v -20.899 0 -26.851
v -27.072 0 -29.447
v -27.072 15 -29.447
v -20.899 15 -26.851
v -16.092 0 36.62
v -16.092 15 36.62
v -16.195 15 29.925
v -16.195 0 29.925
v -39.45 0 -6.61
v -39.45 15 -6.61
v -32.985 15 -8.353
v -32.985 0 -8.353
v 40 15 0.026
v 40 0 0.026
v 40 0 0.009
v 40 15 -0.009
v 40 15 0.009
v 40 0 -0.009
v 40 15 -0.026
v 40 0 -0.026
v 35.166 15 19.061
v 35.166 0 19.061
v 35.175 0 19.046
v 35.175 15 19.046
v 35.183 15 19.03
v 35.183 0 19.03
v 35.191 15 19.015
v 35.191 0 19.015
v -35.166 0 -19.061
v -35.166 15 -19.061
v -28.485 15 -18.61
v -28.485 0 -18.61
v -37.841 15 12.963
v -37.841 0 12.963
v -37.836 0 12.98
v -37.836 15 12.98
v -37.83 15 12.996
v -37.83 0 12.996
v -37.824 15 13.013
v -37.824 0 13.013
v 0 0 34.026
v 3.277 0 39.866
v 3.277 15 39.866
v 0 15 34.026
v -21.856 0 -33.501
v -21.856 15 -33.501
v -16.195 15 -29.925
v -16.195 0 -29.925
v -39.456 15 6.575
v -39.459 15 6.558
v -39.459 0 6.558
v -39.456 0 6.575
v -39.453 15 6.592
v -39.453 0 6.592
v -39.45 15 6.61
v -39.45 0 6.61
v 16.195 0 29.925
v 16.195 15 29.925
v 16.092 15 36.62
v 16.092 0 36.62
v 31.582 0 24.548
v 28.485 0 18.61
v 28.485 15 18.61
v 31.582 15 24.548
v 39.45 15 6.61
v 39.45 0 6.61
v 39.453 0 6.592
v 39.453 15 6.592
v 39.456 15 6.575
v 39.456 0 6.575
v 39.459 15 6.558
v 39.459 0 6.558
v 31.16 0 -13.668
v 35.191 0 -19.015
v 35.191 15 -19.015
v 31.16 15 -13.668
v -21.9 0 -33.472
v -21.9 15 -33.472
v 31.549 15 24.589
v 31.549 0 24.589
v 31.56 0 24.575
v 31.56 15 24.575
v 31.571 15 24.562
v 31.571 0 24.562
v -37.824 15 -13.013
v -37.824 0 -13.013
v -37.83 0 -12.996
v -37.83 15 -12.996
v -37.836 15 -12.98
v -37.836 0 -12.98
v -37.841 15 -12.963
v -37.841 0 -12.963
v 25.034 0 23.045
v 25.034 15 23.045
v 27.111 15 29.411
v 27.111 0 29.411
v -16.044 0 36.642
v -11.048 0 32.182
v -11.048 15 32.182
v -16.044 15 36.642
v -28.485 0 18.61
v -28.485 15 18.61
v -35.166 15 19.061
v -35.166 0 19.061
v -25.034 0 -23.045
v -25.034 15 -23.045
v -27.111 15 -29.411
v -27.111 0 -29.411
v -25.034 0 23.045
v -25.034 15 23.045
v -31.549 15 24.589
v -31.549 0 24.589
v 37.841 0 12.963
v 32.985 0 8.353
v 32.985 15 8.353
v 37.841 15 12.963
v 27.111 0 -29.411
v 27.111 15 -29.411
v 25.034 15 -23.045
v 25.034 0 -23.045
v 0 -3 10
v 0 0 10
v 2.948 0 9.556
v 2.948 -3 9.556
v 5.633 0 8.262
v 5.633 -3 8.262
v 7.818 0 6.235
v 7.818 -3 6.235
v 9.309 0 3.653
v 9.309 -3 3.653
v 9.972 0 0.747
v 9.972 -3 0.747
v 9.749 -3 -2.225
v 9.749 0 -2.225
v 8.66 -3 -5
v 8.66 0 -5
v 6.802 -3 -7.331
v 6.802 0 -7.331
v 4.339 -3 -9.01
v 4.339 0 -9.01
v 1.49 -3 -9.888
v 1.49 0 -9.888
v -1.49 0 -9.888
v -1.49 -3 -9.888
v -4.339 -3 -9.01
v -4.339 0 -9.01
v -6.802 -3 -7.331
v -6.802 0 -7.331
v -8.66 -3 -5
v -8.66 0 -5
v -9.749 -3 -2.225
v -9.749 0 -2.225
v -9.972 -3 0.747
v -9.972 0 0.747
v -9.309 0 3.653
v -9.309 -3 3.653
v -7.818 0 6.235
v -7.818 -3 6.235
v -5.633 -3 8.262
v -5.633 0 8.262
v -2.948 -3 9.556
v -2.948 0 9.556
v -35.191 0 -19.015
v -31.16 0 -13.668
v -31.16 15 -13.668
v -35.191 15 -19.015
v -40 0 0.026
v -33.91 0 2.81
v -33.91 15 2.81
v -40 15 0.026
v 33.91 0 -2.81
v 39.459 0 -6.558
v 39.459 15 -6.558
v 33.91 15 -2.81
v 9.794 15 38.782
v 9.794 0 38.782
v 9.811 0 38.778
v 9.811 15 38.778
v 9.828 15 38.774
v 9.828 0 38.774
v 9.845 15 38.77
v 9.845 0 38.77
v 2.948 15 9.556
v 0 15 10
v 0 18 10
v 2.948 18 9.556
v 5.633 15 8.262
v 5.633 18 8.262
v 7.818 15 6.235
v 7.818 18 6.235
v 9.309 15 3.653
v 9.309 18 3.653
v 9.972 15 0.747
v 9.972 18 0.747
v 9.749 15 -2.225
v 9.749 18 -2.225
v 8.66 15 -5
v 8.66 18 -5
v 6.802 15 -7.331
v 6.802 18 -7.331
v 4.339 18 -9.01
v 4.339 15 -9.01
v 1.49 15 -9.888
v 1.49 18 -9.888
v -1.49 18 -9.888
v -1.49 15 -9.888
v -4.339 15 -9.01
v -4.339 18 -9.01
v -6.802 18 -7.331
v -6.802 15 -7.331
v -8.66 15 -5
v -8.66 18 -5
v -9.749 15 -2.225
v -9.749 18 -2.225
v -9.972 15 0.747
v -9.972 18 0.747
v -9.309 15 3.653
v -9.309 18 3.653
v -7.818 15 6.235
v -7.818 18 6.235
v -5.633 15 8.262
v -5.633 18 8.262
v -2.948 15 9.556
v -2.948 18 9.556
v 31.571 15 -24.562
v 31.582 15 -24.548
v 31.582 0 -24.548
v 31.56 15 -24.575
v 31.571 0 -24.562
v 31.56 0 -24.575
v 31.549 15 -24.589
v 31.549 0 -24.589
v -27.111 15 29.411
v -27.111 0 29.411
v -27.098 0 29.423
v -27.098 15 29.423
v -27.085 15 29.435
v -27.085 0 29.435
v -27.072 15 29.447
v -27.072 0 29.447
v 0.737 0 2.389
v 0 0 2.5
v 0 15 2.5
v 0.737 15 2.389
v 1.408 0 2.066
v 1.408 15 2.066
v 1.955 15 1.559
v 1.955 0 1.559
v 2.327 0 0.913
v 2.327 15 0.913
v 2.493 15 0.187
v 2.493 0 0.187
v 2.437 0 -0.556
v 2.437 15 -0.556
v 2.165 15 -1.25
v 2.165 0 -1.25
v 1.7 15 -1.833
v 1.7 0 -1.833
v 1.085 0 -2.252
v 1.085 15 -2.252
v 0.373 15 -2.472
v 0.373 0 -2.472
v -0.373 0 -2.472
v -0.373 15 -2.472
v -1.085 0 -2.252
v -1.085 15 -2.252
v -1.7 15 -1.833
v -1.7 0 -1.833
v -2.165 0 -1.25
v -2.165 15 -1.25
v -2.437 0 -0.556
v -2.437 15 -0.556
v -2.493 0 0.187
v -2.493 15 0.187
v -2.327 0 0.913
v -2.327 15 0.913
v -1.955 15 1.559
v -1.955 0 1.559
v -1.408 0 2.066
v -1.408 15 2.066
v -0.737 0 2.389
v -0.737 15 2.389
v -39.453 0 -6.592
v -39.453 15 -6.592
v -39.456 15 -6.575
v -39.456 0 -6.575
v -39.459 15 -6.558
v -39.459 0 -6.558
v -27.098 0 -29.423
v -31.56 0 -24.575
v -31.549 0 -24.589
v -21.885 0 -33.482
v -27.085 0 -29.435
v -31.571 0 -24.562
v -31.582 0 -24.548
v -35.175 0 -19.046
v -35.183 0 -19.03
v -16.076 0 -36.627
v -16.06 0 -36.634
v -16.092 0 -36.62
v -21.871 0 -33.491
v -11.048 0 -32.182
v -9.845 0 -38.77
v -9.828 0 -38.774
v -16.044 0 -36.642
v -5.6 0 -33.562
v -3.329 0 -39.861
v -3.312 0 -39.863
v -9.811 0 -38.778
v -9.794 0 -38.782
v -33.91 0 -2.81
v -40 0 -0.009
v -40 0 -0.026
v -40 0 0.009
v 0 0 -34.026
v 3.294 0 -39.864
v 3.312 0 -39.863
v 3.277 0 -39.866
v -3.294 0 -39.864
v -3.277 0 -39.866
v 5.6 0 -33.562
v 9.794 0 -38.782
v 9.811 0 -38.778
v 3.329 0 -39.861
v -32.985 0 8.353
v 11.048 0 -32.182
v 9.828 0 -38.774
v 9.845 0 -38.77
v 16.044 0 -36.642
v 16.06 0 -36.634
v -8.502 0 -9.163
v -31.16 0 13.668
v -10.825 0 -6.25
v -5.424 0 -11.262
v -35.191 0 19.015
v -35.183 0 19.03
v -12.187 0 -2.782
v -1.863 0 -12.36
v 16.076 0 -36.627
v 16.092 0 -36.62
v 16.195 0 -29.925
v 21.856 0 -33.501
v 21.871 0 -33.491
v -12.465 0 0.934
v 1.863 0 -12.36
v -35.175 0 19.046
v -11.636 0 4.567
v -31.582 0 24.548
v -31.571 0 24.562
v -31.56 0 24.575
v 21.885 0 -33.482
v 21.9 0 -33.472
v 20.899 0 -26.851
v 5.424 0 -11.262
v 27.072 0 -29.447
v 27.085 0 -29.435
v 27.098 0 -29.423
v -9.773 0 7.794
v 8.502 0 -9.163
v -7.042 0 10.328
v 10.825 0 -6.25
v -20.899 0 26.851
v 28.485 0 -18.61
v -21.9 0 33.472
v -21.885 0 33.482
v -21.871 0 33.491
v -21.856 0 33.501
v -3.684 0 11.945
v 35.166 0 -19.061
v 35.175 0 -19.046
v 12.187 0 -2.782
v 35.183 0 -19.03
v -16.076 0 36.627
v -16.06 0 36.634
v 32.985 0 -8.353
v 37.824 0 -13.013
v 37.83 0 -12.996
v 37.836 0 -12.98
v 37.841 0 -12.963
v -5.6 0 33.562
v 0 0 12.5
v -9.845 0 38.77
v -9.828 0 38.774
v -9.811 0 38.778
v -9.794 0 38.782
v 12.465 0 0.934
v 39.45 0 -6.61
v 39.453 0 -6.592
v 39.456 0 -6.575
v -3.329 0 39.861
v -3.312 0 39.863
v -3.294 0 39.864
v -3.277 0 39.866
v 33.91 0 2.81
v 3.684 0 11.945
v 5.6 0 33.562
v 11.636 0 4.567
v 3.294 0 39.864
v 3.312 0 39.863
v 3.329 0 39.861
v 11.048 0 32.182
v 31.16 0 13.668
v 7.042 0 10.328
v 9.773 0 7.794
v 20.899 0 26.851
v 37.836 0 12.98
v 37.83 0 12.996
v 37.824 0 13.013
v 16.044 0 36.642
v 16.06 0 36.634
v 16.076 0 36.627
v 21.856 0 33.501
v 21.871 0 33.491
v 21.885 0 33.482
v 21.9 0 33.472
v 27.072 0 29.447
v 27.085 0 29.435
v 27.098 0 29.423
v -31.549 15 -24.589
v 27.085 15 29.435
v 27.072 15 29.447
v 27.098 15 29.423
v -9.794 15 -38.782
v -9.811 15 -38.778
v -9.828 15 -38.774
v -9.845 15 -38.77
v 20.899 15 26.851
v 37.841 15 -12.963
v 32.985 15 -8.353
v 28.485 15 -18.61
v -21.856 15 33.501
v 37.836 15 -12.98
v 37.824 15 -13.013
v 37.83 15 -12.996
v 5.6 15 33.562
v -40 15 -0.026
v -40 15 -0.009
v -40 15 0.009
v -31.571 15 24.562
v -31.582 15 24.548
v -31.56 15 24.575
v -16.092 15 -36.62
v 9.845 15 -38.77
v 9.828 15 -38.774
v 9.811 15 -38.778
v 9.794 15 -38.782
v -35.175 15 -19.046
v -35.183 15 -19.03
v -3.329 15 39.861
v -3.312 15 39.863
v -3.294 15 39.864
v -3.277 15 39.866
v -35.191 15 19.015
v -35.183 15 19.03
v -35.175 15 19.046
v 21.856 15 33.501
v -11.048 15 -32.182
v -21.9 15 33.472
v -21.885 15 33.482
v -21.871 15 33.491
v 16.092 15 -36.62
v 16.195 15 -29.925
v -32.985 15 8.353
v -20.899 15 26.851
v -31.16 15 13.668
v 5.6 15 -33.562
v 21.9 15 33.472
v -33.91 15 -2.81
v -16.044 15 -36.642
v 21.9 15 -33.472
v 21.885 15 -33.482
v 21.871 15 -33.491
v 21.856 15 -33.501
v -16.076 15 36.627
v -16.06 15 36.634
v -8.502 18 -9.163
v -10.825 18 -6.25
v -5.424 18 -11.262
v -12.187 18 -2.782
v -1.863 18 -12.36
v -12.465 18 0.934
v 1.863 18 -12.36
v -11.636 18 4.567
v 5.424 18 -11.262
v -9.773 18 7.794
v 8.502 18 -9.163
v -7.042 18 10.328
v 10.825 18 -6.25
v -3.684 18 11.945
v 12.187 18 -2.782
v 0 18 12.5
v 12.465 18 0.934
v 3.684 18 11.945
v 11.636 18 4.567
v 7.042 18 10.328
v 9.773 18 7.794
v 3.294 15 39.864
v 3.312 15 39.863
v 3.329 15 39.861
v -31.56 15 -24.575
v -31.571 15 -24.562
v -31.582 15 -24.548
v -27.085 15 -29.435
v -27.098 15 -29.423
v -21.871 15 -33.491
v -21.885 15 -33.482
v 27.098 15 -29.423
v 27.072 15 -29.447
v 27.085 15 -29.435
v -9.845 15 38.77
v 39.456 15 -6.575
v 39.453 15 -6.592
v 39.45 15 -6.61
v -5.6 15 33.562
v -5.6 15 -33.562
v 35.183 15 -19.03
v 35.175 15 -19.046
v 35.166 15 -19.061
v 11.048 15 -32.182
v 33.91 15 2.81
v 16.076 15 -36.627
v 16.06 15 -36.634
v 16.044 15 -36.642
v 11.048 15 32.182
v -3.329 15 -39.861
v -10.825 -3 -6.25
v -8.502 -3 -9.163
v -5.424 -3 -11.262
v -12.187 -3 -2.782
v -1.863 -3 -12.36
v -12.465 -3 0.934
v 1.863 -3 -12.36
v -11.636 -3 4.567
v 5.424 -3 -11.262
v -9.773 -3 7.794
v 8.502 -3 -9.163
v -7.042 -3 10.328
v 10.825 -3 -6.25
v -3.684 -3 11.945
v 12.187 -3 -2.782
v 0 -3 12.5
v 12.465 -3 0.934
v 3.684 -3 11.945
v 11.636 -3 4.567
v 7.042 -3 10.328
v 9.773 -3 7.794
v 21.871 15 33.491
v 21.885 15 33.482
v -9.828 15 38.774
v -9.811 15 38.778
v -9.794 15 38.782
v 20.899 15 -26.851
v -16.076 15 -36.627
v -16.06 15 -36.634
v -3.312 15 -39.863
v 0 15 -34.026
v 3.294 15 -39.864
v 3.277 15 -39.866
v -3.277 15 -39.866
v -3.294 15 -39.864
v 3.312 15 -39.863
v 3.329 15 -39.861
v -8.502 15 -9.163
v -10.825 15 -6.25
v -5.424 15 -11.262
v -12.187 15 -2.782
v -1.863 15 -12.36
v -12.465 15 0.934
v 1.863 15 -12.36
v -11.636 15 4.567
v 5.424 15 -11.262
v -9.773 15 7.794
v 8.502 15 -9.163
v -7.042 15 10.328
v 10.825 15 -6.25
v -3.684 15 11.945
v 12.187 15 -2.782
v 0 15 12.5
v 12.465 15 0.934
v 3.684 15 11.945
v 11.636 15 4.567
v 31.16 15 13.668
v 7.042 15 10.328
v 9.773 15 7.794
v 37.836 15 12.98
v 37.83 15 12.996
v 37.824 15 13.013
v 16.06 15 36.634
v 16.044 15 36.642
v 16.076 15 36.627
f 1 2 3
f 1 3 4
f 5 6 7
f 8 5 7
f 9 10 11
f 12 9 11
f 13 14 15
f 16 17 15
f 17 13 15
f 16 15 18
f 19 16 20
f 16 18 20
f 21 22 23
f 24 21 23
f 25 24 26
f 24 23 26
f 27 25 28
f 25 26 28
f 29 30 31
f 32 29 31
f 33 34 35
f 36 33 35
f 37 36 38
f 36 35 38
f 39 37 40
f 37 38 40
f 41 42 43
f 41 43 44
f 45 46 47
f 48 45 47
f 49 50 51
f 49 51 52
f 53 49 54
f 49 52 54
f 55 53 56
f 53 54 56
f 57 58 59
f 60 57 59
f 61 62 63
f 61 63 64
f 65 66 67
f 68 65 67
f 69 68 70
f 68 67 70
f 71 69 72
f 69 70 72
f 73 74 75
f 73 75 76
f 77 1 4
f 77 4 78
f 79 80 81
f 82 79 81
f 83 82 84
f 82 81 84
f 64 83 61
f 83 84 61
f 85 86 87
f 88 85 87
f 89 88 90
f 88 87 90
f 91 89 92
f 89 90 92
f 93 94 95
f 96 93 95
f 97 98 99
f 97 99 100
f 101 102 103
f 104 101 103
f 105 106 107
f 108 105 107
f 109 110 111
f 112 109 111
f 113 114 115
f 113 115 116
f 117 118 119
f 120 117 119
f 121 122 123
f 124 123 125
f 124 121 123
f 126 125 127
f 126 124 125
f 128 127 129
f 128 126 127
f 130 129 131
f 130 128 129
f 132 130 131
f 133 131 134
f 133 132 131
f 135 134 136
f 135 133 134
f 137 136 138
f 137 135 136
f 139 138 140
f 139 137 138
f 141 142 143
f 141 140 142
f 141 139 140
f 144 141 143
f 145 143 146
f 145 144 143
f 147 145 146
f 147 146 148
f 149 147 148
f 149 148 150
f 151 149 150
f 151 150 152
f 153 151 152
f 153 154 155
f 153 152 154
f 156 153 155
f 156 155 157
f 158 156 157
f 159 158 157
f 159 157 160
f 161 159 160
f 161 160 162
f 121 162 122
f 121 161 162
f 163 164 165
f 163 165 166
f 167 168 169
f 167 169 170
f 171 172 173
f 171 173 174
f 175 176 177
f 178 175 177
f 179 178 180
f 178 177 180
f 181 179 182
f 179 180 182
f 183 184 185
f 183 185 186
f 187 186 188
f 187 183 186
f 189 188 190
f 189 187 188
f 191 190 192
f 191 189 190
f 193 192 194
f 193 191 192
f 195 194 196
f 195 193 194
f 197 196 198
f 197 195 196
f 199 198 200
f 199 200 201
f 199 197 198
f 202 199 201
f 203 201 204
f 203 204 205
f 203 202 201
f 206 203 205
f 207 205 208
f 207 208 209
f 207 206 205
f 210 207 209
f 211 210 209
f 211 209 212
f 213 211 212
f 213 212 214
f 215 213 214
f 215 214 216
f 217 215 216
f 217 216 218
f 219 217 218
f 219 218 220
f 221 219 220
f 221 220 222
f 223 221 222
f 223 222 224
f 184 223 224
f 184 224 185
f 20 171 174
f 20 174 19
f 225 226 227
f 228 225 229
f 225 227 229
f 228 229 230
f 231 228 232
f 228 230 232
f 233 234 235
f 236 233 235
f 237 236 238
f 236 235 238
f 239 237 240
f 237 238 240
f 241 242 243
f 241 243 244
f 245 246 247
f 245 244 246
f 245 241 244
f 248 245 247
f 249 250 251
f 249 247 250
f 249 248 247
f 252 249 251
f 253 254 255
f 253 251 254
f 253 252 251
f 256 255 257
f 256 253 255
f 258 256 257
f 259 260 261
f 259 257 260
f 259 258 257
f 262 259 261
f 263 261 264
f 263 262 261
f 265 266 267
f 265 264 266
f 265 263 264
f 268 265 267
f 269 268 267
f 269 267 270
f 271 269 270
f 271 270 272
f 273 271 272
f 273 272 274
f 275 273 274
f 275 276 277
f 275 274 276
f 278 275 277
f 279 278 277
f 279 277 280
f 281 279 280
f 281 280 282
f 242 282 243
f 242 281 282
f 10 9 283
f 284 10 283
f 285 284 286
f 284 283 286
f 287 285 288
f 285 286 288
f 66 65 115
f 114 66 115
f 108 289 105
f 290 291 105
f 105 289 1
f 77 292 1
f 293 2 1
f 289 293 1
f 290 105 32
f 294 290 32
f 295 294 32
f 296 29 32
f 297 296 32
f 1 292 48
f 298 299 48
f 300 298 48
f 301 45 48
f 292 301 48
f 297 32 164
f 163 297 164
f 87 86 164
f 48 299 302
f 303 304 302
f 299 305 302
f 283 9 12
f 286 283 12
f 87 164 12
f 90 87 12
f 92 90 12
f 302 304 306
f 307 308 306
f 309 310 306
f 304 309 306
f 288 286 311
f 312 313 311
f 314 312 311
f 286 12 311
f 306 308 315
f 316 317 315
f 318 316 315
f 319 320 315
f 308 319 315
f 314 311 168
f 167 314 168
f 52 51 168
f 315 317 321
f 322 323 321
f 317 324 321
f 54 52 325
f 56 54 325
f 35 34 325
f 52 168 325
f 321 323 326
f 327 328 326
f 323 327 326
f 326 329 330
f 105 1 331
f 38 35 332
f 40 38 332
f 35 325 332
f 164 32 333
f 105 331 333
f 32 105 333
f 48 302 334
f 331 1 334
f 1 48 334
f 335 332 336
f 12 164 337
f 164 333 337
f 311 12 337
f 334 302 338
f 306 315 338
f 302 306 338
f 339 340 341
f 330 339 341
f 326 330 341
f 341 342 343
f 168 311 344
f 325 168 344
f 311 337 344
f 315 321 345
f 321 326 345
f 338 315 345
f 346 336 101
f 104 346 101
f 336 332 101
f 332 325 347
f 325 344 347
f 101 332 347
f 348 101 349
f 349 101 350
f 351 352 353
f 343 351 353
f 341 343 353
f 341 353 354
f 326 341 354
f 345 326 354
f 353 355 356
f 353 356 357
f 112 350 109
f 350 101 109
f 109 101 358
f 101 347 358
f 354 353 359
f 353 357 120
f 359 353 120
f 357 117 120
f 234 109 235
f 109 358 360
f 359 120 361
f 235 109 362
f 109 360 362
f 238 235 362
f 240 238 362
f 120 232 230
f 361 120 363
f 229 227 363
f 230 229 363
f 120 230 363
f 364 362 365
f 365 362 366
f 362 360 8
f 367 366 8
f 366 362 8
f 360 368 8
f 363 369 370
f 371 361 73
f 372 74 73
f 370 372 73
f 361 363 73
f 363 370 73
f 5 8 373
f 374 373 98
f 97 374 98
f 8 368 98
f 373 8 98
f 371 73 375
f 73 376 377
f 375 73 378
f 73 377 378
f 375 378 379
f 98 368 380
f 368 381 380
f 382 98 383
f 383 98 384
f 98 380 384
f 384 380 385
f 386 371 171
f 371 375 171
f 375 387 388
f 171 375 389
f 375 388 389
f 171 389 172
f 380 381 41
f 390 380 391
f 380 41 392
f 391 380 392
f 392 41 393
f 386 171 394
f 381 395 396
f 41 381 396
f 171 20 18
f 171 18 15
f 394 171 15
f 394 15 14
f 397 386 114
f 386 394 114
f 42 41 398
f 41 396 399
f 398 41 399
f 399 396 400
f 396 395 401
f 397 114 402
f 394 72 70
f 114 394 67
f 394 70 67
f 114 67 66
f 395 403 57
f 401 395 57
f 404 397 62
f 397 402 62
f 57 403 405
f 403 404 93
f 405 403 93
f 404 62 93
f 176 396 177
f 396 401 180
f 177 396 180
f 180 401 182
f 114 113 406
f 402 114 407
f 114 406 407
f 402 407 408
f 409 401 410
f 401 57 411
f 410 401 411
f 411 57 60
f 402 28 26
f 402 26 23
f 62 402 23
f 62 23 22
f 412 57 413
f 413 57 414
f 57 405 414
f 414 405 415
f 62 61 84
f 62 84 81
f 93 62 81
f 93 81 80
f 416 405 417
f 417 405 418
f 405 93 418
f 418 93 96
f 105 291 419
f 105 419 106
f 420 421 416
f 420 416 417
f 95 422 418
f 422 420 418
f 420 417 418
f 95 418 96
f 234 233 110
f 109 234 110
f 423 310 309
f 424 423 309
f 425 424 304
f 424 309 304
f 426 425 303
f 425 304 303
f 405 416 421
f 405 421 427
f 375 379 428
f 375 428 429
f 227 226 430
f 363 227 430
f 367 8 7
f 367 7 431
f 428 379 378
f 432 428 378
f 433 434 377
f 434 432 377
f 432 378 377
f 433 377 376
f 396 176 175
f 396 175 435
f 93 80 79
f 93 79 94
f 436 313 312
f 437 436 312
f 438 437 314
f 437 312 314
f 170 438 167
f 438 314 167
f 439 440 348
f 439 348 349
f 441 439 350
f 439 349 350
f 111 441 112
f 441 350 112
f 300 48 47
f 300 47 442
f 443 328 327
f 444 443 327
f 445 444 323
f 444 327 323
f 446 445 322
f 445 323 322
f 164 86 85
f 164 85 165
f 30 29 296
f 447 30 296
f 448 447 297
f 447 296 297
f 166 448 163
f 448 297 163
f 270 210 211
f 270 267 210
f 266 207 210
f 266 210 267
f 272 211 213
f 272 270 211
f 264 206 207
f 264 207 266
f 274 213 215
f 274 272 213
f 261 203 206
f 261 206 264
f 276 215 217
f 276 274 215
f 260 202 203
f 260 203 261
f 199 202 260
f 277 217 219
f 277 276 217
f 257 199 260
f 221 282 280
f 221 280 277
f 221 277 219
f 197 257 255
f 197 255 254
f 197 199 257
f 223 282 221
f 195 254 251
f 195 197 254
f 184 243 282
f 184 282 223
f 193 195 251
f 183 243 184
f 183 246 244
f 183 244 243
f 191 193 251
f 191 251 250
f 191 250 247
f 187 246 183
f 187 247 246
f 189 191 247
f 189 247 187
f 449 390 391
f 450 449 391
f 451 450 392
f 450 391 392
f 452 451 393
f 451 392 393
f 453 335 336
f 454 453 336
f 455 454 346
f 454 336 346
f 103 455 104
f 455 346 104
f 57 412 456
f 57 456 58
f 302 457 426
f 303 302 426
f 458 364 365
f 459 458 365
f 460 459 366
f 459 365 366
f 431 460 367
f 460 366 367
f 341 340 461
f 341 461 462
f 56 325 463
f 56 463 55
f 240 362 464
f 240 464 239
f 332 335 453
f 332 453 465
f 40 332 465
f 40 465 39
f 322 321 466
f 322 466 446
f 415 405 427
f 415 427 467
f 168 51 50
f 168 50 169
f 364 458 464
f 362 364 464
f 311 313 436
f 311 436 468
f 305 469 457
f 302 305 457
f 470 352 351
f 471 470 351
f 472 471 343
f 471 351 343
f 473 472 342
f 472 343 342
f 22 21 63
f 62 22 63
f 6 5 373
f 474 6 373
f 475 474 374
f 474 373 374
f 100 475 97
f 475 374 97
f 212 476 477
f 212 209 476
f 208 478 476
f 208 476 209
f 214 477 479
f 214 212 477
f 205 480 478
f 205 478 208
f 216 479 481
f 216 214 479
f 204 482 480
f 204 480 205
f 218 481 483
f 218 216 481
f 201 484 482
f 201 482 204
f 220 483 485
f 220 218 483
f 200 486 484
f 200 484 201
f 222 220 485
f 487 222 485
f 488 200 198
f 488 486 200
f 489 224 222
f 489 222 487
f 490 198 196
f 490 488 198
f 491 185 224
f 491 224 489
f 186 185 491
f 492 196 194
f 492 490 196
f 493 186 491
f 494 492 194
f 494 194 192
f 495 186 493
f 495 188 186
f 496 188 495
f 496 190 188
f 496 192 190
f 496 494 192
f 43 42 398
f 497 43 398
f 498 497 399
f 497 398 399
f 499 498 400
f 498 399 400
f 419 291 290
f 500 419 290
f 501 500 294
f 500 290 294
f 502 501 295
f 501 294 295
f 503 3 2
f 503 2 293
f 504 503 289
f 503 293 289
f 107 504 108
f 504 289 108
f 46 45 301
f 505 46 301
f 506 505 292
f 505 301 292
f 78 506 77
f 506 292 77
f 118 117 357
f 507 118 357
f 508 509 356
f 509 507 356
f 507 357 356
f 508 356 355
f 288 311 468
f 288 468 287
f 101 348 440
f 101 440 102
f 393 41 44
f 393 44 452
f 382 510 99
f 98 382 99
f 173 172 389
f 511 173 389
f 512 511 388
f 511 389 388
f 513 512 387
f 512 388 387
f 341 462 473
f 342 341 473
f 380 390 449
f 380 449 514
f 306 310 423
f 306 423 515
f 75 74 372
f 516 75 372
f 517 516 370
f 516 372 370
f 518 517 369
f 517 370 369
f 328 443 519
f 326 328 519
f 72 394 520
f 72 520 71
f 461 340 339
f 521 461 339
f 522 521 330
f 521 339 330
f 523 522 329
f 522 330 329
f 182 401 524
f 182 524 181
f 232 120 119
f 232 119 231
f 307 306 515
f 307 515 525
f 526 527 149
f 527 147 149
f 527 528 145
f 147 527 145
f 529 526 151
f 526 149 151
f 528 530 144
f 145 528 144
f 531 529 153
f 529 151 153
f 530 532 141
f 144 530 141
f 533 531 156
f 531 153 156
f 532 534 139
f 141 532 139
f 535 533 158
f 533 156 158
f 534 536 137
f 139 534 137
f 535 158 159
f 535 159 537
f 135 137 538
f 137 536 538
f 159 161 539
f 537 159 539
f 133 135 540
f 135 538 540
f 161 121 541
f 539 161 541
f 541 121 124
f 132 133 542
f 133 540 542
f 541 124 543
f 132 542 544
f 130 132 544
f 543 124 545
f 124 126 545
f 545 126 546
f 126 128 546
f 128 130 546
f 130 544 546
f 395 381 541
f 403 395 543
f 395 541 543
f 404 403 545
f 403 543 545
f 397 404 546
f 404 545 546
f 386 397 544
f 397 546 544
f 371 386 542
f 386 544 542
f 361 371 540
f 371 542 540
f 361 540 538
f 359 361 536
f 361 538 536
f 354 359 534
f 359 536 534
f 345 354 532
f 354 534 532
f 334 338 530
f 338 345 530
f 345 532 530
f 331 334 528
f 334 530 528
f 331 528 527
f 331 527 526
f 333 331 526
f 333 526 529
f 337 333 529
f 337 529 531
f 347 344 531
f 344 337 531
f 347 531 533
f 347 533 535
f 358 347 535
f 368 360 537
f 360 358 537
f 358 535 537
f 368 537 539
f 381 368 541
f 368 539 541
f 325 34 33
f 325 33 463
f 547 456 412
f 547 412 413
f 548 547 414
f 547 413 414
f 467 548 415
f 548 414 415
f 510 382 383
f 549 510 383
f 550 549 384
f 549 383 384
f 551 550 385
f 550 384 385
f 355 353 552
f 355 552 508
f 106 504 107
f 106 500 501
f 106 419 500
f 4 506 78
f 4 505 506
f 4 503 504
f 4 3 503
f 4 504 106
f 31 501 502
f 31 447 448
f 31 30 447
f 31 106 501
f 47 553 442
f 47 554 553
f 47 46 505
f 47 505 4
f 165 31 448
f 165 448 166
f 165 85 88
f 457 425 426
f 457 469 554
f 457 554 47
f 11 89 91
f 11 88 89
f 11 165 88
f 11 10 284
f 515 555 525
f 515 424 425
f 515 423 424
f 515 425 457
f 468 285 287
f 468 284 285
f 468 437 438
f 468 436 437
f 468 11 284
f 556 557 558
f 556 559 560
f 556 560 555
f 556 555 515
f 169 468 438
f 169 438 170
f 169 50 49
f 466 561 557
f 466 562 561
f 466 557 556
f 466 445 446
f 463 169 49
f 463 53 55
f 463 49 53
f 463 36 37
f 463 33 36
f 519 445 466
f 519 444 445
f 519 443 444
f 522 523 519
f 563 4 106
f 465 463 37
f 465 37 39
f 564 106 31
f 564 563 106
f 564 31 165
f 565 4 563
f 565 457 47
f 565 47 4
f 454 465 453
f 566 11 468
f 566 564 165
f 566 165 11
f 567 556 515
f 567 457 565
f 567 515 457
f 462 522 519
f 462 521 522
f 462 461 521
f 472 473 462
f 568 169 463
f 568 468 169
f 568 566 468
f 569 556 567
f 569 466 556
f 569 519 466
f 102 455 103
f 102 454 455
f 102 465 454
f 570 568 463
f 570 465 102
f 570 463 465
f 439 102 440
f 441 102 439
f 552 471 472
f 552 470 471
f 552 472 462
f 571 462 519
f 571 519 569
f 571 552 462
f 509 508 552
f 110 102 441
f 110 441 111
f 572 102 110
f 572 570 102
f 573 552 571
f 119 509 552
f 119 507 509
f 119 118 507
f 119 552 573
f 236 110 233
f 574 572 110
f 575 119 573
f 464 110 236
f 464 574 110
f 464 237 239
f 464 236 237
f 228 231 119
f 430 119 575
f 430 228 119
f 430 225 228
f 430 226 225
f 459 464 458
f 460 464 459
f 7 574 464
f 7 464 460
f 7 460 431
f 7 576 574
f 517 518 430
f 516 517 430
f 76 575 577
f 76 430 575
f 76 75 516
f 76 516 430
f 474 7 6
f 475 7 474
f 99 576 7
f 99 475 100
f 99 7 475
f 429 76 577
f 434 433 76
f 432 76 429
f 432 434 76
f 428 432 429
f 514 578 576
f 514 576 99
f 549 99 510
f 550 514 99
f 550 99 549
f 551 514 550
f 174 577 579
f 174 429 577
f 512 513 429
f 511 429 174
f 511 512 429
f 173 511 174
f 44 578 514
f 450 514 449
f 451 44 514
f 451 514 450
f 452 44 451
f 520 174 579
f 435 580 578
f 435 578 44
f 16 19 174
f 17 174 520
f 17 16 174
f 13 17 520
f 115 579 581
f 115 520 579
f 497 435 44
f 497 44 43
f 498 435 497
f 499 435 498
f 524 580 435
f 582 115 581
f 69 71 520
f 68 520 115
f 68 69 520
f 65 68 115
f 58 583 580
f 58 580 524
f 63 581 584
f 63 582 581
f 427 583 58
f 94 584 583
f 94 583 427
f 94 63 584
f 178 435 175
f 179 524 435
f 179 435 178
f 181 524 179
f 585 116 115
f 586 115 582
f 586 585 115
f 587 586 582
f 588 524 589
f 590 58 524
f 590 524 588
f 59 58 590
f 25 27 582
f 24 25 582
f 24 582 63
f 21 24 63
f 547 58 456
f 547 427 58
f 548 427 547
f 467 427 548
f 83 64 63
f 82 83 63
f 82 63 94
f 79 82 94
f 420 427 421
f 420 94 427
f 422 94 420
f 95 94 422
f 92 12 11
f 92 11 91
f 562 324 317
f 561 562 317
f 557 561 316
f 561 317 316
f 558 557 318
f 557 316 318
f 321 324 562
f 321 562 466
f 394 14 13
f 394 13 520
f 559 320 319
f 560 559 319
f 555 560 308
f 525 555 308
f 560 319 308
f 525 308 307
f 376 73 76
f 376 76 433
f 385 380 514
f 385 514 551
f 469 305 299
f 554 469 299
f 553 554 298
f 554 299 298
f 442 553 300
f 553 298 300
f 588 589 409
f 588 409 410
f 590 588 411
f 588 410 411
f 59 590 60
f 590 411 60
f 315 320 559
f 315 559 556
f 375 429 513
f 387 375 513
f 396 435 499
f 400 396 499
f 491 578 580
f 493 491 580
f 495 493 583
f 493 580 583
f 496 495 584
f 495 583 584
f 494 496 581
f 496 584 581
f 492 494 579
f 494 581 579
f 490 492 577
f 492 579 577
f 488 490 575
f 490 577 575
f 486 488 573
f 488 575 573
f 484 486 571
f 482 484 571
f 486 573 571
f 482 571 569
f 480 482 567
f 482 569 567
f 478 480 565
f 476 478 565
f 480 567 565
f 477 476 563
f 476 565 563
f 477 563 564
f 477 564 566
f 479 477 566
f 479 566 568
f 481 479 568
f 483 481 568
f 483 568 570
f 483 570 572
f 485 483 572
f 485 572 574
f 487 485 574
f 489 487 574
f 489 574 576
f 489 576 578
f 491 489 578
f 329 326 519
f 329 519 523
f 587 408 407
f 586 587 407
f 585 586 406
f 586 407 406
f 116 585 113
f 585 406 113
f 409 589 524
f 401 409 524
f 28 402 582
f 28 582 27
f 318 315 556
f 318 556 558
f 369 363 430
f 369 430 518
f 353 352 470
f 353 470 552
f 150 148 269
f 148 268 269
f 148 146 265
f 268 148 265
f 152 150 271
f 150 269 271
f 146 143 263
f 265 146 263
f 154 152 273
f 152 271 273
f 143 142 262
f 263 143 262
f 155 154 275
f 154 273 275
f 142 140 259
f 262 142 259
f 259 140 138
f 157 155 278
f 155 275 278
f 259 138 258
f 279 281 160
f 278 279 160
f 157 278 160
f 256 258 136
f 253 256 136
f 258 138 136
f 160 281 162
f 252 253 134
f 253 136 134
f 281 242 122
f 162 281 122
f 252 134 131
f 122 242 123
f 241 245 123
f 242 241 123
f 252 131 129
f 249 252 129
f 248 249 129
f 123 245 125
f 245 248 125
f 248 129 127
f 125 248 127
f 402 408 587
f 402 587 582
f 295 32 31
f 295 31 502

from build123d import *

# Parameters (mm, degrees)
CROQUIS1_R                   = 40
SALIENTE_EXTRUIR1_DEPTH      = 15
CORTAR_EXTRUIR3_START        = -55
CORTAR_EXTRUIR3_DEPTH        = 75
MATRIZC1_COUNT               = 38
SALIENTE_EXTRUIR2_DEPTH      = 18
SALIENTE_EXTRUIR2_DEPTH_BACK = 3
CROQUIS4_R                   = 12.5
CROQUIS4_R_2                 = 10
CORTAR_EXTRUIR4_DEPTH        = 26
CORTAR_EXTRUIR4_DEPTH_BACK   = 41
CROQUIS5_R                   = 2.5


with BuildPart() as part:
    # Croquis1 → Saliente-Extruir1 (new body)
    with BuildSketch(Plane(origin=(0, 0, 0), x_dir=(1, 0, 0), z_dir=(0, 1, 0))):
        with Locations(Location((0, 0, 0), (0, 0, 270))):
            Circle(CROQUIS1_R)
    extrude(amount=SALIENTE_EXTRUIR1_DEPTH)

    # Croquis2 → Cortar-Extruir3 (cut)
    with BuildSketch(Plane(origin=(0, 0, 0), x_dir=(1, 0, 0), z_dir=(0, 1, 0)).offset(CORTAR_EXTRUIR3_START)):
        Polygon((0, 34.025968572), (3.276888375, 39.865549069), (0, 41.704379346), (-3.276888375, 39.865549069), align=None)
    cortar_extruir3 = extrude(amount=CORTAR_EXTRUIR3_DEPTH, mode=Mode.SUBTRACT)

    # MatrizC1: Cortar-Extruir3 ×38 about axis
    matrizc1_axis = Axis((0, 0, 0), (0, 1, 0))
    for i in range(1, MATRIZC1_COUNT):
        add(cortar_extruir3.rotate(matrizc1_axis, i * 360 / MATRIZC1_COUNT), mode=Mode.SUBTRACT)

    # Croquis4 → Saliente-Extruir2 (add, two sides: drawn at the far end of the back side and taken through both)
    with BuildSketch(Plane(origin=(0, 0, 0), x_dir=(1, 0, 0), z_dir=(0, 1, 0)).offset(-SALIENTE_EXTRUIR2_DEPTH_BACK)):
        with Locations(Location((0, 0, 0), (0, 0, 270))):
            Circle(CROQUIS4_R)
        with Locations(Location((0, 0, 0), (0, 0, 270))):
            Circle(CROQUIS4_R_2, mode=Mode.SUBTRACT)
    extrude(amount=SALIENTE_EXTRUIR2_DEPTH + SALIENTE_EXTRUIR2_DEPTH_BACK)

    # Croquis5 → Cortar-Extruir4 (cut, two sides: drawn at the far end of the back side and taken through both)
    with BuildSketch(Plane(origin=(0, 0, 0), x_dir=(1, 0, 0), z_dir=(0, 1, 0)).offset(-CORTAR_EXTRUIR4_DEPTH_BACK)):
        with Locations(Location((0, 0, 0), (0, 0, 270))):
            Circle(CROQUIS5_R)
    extrude(amount=CORTAR_EXTRUIR4_DEPTH + CORTAR_EXTRUIR4_DEPTH_BACK, mode=Mode.SUBTRACT)


solid = part.part
